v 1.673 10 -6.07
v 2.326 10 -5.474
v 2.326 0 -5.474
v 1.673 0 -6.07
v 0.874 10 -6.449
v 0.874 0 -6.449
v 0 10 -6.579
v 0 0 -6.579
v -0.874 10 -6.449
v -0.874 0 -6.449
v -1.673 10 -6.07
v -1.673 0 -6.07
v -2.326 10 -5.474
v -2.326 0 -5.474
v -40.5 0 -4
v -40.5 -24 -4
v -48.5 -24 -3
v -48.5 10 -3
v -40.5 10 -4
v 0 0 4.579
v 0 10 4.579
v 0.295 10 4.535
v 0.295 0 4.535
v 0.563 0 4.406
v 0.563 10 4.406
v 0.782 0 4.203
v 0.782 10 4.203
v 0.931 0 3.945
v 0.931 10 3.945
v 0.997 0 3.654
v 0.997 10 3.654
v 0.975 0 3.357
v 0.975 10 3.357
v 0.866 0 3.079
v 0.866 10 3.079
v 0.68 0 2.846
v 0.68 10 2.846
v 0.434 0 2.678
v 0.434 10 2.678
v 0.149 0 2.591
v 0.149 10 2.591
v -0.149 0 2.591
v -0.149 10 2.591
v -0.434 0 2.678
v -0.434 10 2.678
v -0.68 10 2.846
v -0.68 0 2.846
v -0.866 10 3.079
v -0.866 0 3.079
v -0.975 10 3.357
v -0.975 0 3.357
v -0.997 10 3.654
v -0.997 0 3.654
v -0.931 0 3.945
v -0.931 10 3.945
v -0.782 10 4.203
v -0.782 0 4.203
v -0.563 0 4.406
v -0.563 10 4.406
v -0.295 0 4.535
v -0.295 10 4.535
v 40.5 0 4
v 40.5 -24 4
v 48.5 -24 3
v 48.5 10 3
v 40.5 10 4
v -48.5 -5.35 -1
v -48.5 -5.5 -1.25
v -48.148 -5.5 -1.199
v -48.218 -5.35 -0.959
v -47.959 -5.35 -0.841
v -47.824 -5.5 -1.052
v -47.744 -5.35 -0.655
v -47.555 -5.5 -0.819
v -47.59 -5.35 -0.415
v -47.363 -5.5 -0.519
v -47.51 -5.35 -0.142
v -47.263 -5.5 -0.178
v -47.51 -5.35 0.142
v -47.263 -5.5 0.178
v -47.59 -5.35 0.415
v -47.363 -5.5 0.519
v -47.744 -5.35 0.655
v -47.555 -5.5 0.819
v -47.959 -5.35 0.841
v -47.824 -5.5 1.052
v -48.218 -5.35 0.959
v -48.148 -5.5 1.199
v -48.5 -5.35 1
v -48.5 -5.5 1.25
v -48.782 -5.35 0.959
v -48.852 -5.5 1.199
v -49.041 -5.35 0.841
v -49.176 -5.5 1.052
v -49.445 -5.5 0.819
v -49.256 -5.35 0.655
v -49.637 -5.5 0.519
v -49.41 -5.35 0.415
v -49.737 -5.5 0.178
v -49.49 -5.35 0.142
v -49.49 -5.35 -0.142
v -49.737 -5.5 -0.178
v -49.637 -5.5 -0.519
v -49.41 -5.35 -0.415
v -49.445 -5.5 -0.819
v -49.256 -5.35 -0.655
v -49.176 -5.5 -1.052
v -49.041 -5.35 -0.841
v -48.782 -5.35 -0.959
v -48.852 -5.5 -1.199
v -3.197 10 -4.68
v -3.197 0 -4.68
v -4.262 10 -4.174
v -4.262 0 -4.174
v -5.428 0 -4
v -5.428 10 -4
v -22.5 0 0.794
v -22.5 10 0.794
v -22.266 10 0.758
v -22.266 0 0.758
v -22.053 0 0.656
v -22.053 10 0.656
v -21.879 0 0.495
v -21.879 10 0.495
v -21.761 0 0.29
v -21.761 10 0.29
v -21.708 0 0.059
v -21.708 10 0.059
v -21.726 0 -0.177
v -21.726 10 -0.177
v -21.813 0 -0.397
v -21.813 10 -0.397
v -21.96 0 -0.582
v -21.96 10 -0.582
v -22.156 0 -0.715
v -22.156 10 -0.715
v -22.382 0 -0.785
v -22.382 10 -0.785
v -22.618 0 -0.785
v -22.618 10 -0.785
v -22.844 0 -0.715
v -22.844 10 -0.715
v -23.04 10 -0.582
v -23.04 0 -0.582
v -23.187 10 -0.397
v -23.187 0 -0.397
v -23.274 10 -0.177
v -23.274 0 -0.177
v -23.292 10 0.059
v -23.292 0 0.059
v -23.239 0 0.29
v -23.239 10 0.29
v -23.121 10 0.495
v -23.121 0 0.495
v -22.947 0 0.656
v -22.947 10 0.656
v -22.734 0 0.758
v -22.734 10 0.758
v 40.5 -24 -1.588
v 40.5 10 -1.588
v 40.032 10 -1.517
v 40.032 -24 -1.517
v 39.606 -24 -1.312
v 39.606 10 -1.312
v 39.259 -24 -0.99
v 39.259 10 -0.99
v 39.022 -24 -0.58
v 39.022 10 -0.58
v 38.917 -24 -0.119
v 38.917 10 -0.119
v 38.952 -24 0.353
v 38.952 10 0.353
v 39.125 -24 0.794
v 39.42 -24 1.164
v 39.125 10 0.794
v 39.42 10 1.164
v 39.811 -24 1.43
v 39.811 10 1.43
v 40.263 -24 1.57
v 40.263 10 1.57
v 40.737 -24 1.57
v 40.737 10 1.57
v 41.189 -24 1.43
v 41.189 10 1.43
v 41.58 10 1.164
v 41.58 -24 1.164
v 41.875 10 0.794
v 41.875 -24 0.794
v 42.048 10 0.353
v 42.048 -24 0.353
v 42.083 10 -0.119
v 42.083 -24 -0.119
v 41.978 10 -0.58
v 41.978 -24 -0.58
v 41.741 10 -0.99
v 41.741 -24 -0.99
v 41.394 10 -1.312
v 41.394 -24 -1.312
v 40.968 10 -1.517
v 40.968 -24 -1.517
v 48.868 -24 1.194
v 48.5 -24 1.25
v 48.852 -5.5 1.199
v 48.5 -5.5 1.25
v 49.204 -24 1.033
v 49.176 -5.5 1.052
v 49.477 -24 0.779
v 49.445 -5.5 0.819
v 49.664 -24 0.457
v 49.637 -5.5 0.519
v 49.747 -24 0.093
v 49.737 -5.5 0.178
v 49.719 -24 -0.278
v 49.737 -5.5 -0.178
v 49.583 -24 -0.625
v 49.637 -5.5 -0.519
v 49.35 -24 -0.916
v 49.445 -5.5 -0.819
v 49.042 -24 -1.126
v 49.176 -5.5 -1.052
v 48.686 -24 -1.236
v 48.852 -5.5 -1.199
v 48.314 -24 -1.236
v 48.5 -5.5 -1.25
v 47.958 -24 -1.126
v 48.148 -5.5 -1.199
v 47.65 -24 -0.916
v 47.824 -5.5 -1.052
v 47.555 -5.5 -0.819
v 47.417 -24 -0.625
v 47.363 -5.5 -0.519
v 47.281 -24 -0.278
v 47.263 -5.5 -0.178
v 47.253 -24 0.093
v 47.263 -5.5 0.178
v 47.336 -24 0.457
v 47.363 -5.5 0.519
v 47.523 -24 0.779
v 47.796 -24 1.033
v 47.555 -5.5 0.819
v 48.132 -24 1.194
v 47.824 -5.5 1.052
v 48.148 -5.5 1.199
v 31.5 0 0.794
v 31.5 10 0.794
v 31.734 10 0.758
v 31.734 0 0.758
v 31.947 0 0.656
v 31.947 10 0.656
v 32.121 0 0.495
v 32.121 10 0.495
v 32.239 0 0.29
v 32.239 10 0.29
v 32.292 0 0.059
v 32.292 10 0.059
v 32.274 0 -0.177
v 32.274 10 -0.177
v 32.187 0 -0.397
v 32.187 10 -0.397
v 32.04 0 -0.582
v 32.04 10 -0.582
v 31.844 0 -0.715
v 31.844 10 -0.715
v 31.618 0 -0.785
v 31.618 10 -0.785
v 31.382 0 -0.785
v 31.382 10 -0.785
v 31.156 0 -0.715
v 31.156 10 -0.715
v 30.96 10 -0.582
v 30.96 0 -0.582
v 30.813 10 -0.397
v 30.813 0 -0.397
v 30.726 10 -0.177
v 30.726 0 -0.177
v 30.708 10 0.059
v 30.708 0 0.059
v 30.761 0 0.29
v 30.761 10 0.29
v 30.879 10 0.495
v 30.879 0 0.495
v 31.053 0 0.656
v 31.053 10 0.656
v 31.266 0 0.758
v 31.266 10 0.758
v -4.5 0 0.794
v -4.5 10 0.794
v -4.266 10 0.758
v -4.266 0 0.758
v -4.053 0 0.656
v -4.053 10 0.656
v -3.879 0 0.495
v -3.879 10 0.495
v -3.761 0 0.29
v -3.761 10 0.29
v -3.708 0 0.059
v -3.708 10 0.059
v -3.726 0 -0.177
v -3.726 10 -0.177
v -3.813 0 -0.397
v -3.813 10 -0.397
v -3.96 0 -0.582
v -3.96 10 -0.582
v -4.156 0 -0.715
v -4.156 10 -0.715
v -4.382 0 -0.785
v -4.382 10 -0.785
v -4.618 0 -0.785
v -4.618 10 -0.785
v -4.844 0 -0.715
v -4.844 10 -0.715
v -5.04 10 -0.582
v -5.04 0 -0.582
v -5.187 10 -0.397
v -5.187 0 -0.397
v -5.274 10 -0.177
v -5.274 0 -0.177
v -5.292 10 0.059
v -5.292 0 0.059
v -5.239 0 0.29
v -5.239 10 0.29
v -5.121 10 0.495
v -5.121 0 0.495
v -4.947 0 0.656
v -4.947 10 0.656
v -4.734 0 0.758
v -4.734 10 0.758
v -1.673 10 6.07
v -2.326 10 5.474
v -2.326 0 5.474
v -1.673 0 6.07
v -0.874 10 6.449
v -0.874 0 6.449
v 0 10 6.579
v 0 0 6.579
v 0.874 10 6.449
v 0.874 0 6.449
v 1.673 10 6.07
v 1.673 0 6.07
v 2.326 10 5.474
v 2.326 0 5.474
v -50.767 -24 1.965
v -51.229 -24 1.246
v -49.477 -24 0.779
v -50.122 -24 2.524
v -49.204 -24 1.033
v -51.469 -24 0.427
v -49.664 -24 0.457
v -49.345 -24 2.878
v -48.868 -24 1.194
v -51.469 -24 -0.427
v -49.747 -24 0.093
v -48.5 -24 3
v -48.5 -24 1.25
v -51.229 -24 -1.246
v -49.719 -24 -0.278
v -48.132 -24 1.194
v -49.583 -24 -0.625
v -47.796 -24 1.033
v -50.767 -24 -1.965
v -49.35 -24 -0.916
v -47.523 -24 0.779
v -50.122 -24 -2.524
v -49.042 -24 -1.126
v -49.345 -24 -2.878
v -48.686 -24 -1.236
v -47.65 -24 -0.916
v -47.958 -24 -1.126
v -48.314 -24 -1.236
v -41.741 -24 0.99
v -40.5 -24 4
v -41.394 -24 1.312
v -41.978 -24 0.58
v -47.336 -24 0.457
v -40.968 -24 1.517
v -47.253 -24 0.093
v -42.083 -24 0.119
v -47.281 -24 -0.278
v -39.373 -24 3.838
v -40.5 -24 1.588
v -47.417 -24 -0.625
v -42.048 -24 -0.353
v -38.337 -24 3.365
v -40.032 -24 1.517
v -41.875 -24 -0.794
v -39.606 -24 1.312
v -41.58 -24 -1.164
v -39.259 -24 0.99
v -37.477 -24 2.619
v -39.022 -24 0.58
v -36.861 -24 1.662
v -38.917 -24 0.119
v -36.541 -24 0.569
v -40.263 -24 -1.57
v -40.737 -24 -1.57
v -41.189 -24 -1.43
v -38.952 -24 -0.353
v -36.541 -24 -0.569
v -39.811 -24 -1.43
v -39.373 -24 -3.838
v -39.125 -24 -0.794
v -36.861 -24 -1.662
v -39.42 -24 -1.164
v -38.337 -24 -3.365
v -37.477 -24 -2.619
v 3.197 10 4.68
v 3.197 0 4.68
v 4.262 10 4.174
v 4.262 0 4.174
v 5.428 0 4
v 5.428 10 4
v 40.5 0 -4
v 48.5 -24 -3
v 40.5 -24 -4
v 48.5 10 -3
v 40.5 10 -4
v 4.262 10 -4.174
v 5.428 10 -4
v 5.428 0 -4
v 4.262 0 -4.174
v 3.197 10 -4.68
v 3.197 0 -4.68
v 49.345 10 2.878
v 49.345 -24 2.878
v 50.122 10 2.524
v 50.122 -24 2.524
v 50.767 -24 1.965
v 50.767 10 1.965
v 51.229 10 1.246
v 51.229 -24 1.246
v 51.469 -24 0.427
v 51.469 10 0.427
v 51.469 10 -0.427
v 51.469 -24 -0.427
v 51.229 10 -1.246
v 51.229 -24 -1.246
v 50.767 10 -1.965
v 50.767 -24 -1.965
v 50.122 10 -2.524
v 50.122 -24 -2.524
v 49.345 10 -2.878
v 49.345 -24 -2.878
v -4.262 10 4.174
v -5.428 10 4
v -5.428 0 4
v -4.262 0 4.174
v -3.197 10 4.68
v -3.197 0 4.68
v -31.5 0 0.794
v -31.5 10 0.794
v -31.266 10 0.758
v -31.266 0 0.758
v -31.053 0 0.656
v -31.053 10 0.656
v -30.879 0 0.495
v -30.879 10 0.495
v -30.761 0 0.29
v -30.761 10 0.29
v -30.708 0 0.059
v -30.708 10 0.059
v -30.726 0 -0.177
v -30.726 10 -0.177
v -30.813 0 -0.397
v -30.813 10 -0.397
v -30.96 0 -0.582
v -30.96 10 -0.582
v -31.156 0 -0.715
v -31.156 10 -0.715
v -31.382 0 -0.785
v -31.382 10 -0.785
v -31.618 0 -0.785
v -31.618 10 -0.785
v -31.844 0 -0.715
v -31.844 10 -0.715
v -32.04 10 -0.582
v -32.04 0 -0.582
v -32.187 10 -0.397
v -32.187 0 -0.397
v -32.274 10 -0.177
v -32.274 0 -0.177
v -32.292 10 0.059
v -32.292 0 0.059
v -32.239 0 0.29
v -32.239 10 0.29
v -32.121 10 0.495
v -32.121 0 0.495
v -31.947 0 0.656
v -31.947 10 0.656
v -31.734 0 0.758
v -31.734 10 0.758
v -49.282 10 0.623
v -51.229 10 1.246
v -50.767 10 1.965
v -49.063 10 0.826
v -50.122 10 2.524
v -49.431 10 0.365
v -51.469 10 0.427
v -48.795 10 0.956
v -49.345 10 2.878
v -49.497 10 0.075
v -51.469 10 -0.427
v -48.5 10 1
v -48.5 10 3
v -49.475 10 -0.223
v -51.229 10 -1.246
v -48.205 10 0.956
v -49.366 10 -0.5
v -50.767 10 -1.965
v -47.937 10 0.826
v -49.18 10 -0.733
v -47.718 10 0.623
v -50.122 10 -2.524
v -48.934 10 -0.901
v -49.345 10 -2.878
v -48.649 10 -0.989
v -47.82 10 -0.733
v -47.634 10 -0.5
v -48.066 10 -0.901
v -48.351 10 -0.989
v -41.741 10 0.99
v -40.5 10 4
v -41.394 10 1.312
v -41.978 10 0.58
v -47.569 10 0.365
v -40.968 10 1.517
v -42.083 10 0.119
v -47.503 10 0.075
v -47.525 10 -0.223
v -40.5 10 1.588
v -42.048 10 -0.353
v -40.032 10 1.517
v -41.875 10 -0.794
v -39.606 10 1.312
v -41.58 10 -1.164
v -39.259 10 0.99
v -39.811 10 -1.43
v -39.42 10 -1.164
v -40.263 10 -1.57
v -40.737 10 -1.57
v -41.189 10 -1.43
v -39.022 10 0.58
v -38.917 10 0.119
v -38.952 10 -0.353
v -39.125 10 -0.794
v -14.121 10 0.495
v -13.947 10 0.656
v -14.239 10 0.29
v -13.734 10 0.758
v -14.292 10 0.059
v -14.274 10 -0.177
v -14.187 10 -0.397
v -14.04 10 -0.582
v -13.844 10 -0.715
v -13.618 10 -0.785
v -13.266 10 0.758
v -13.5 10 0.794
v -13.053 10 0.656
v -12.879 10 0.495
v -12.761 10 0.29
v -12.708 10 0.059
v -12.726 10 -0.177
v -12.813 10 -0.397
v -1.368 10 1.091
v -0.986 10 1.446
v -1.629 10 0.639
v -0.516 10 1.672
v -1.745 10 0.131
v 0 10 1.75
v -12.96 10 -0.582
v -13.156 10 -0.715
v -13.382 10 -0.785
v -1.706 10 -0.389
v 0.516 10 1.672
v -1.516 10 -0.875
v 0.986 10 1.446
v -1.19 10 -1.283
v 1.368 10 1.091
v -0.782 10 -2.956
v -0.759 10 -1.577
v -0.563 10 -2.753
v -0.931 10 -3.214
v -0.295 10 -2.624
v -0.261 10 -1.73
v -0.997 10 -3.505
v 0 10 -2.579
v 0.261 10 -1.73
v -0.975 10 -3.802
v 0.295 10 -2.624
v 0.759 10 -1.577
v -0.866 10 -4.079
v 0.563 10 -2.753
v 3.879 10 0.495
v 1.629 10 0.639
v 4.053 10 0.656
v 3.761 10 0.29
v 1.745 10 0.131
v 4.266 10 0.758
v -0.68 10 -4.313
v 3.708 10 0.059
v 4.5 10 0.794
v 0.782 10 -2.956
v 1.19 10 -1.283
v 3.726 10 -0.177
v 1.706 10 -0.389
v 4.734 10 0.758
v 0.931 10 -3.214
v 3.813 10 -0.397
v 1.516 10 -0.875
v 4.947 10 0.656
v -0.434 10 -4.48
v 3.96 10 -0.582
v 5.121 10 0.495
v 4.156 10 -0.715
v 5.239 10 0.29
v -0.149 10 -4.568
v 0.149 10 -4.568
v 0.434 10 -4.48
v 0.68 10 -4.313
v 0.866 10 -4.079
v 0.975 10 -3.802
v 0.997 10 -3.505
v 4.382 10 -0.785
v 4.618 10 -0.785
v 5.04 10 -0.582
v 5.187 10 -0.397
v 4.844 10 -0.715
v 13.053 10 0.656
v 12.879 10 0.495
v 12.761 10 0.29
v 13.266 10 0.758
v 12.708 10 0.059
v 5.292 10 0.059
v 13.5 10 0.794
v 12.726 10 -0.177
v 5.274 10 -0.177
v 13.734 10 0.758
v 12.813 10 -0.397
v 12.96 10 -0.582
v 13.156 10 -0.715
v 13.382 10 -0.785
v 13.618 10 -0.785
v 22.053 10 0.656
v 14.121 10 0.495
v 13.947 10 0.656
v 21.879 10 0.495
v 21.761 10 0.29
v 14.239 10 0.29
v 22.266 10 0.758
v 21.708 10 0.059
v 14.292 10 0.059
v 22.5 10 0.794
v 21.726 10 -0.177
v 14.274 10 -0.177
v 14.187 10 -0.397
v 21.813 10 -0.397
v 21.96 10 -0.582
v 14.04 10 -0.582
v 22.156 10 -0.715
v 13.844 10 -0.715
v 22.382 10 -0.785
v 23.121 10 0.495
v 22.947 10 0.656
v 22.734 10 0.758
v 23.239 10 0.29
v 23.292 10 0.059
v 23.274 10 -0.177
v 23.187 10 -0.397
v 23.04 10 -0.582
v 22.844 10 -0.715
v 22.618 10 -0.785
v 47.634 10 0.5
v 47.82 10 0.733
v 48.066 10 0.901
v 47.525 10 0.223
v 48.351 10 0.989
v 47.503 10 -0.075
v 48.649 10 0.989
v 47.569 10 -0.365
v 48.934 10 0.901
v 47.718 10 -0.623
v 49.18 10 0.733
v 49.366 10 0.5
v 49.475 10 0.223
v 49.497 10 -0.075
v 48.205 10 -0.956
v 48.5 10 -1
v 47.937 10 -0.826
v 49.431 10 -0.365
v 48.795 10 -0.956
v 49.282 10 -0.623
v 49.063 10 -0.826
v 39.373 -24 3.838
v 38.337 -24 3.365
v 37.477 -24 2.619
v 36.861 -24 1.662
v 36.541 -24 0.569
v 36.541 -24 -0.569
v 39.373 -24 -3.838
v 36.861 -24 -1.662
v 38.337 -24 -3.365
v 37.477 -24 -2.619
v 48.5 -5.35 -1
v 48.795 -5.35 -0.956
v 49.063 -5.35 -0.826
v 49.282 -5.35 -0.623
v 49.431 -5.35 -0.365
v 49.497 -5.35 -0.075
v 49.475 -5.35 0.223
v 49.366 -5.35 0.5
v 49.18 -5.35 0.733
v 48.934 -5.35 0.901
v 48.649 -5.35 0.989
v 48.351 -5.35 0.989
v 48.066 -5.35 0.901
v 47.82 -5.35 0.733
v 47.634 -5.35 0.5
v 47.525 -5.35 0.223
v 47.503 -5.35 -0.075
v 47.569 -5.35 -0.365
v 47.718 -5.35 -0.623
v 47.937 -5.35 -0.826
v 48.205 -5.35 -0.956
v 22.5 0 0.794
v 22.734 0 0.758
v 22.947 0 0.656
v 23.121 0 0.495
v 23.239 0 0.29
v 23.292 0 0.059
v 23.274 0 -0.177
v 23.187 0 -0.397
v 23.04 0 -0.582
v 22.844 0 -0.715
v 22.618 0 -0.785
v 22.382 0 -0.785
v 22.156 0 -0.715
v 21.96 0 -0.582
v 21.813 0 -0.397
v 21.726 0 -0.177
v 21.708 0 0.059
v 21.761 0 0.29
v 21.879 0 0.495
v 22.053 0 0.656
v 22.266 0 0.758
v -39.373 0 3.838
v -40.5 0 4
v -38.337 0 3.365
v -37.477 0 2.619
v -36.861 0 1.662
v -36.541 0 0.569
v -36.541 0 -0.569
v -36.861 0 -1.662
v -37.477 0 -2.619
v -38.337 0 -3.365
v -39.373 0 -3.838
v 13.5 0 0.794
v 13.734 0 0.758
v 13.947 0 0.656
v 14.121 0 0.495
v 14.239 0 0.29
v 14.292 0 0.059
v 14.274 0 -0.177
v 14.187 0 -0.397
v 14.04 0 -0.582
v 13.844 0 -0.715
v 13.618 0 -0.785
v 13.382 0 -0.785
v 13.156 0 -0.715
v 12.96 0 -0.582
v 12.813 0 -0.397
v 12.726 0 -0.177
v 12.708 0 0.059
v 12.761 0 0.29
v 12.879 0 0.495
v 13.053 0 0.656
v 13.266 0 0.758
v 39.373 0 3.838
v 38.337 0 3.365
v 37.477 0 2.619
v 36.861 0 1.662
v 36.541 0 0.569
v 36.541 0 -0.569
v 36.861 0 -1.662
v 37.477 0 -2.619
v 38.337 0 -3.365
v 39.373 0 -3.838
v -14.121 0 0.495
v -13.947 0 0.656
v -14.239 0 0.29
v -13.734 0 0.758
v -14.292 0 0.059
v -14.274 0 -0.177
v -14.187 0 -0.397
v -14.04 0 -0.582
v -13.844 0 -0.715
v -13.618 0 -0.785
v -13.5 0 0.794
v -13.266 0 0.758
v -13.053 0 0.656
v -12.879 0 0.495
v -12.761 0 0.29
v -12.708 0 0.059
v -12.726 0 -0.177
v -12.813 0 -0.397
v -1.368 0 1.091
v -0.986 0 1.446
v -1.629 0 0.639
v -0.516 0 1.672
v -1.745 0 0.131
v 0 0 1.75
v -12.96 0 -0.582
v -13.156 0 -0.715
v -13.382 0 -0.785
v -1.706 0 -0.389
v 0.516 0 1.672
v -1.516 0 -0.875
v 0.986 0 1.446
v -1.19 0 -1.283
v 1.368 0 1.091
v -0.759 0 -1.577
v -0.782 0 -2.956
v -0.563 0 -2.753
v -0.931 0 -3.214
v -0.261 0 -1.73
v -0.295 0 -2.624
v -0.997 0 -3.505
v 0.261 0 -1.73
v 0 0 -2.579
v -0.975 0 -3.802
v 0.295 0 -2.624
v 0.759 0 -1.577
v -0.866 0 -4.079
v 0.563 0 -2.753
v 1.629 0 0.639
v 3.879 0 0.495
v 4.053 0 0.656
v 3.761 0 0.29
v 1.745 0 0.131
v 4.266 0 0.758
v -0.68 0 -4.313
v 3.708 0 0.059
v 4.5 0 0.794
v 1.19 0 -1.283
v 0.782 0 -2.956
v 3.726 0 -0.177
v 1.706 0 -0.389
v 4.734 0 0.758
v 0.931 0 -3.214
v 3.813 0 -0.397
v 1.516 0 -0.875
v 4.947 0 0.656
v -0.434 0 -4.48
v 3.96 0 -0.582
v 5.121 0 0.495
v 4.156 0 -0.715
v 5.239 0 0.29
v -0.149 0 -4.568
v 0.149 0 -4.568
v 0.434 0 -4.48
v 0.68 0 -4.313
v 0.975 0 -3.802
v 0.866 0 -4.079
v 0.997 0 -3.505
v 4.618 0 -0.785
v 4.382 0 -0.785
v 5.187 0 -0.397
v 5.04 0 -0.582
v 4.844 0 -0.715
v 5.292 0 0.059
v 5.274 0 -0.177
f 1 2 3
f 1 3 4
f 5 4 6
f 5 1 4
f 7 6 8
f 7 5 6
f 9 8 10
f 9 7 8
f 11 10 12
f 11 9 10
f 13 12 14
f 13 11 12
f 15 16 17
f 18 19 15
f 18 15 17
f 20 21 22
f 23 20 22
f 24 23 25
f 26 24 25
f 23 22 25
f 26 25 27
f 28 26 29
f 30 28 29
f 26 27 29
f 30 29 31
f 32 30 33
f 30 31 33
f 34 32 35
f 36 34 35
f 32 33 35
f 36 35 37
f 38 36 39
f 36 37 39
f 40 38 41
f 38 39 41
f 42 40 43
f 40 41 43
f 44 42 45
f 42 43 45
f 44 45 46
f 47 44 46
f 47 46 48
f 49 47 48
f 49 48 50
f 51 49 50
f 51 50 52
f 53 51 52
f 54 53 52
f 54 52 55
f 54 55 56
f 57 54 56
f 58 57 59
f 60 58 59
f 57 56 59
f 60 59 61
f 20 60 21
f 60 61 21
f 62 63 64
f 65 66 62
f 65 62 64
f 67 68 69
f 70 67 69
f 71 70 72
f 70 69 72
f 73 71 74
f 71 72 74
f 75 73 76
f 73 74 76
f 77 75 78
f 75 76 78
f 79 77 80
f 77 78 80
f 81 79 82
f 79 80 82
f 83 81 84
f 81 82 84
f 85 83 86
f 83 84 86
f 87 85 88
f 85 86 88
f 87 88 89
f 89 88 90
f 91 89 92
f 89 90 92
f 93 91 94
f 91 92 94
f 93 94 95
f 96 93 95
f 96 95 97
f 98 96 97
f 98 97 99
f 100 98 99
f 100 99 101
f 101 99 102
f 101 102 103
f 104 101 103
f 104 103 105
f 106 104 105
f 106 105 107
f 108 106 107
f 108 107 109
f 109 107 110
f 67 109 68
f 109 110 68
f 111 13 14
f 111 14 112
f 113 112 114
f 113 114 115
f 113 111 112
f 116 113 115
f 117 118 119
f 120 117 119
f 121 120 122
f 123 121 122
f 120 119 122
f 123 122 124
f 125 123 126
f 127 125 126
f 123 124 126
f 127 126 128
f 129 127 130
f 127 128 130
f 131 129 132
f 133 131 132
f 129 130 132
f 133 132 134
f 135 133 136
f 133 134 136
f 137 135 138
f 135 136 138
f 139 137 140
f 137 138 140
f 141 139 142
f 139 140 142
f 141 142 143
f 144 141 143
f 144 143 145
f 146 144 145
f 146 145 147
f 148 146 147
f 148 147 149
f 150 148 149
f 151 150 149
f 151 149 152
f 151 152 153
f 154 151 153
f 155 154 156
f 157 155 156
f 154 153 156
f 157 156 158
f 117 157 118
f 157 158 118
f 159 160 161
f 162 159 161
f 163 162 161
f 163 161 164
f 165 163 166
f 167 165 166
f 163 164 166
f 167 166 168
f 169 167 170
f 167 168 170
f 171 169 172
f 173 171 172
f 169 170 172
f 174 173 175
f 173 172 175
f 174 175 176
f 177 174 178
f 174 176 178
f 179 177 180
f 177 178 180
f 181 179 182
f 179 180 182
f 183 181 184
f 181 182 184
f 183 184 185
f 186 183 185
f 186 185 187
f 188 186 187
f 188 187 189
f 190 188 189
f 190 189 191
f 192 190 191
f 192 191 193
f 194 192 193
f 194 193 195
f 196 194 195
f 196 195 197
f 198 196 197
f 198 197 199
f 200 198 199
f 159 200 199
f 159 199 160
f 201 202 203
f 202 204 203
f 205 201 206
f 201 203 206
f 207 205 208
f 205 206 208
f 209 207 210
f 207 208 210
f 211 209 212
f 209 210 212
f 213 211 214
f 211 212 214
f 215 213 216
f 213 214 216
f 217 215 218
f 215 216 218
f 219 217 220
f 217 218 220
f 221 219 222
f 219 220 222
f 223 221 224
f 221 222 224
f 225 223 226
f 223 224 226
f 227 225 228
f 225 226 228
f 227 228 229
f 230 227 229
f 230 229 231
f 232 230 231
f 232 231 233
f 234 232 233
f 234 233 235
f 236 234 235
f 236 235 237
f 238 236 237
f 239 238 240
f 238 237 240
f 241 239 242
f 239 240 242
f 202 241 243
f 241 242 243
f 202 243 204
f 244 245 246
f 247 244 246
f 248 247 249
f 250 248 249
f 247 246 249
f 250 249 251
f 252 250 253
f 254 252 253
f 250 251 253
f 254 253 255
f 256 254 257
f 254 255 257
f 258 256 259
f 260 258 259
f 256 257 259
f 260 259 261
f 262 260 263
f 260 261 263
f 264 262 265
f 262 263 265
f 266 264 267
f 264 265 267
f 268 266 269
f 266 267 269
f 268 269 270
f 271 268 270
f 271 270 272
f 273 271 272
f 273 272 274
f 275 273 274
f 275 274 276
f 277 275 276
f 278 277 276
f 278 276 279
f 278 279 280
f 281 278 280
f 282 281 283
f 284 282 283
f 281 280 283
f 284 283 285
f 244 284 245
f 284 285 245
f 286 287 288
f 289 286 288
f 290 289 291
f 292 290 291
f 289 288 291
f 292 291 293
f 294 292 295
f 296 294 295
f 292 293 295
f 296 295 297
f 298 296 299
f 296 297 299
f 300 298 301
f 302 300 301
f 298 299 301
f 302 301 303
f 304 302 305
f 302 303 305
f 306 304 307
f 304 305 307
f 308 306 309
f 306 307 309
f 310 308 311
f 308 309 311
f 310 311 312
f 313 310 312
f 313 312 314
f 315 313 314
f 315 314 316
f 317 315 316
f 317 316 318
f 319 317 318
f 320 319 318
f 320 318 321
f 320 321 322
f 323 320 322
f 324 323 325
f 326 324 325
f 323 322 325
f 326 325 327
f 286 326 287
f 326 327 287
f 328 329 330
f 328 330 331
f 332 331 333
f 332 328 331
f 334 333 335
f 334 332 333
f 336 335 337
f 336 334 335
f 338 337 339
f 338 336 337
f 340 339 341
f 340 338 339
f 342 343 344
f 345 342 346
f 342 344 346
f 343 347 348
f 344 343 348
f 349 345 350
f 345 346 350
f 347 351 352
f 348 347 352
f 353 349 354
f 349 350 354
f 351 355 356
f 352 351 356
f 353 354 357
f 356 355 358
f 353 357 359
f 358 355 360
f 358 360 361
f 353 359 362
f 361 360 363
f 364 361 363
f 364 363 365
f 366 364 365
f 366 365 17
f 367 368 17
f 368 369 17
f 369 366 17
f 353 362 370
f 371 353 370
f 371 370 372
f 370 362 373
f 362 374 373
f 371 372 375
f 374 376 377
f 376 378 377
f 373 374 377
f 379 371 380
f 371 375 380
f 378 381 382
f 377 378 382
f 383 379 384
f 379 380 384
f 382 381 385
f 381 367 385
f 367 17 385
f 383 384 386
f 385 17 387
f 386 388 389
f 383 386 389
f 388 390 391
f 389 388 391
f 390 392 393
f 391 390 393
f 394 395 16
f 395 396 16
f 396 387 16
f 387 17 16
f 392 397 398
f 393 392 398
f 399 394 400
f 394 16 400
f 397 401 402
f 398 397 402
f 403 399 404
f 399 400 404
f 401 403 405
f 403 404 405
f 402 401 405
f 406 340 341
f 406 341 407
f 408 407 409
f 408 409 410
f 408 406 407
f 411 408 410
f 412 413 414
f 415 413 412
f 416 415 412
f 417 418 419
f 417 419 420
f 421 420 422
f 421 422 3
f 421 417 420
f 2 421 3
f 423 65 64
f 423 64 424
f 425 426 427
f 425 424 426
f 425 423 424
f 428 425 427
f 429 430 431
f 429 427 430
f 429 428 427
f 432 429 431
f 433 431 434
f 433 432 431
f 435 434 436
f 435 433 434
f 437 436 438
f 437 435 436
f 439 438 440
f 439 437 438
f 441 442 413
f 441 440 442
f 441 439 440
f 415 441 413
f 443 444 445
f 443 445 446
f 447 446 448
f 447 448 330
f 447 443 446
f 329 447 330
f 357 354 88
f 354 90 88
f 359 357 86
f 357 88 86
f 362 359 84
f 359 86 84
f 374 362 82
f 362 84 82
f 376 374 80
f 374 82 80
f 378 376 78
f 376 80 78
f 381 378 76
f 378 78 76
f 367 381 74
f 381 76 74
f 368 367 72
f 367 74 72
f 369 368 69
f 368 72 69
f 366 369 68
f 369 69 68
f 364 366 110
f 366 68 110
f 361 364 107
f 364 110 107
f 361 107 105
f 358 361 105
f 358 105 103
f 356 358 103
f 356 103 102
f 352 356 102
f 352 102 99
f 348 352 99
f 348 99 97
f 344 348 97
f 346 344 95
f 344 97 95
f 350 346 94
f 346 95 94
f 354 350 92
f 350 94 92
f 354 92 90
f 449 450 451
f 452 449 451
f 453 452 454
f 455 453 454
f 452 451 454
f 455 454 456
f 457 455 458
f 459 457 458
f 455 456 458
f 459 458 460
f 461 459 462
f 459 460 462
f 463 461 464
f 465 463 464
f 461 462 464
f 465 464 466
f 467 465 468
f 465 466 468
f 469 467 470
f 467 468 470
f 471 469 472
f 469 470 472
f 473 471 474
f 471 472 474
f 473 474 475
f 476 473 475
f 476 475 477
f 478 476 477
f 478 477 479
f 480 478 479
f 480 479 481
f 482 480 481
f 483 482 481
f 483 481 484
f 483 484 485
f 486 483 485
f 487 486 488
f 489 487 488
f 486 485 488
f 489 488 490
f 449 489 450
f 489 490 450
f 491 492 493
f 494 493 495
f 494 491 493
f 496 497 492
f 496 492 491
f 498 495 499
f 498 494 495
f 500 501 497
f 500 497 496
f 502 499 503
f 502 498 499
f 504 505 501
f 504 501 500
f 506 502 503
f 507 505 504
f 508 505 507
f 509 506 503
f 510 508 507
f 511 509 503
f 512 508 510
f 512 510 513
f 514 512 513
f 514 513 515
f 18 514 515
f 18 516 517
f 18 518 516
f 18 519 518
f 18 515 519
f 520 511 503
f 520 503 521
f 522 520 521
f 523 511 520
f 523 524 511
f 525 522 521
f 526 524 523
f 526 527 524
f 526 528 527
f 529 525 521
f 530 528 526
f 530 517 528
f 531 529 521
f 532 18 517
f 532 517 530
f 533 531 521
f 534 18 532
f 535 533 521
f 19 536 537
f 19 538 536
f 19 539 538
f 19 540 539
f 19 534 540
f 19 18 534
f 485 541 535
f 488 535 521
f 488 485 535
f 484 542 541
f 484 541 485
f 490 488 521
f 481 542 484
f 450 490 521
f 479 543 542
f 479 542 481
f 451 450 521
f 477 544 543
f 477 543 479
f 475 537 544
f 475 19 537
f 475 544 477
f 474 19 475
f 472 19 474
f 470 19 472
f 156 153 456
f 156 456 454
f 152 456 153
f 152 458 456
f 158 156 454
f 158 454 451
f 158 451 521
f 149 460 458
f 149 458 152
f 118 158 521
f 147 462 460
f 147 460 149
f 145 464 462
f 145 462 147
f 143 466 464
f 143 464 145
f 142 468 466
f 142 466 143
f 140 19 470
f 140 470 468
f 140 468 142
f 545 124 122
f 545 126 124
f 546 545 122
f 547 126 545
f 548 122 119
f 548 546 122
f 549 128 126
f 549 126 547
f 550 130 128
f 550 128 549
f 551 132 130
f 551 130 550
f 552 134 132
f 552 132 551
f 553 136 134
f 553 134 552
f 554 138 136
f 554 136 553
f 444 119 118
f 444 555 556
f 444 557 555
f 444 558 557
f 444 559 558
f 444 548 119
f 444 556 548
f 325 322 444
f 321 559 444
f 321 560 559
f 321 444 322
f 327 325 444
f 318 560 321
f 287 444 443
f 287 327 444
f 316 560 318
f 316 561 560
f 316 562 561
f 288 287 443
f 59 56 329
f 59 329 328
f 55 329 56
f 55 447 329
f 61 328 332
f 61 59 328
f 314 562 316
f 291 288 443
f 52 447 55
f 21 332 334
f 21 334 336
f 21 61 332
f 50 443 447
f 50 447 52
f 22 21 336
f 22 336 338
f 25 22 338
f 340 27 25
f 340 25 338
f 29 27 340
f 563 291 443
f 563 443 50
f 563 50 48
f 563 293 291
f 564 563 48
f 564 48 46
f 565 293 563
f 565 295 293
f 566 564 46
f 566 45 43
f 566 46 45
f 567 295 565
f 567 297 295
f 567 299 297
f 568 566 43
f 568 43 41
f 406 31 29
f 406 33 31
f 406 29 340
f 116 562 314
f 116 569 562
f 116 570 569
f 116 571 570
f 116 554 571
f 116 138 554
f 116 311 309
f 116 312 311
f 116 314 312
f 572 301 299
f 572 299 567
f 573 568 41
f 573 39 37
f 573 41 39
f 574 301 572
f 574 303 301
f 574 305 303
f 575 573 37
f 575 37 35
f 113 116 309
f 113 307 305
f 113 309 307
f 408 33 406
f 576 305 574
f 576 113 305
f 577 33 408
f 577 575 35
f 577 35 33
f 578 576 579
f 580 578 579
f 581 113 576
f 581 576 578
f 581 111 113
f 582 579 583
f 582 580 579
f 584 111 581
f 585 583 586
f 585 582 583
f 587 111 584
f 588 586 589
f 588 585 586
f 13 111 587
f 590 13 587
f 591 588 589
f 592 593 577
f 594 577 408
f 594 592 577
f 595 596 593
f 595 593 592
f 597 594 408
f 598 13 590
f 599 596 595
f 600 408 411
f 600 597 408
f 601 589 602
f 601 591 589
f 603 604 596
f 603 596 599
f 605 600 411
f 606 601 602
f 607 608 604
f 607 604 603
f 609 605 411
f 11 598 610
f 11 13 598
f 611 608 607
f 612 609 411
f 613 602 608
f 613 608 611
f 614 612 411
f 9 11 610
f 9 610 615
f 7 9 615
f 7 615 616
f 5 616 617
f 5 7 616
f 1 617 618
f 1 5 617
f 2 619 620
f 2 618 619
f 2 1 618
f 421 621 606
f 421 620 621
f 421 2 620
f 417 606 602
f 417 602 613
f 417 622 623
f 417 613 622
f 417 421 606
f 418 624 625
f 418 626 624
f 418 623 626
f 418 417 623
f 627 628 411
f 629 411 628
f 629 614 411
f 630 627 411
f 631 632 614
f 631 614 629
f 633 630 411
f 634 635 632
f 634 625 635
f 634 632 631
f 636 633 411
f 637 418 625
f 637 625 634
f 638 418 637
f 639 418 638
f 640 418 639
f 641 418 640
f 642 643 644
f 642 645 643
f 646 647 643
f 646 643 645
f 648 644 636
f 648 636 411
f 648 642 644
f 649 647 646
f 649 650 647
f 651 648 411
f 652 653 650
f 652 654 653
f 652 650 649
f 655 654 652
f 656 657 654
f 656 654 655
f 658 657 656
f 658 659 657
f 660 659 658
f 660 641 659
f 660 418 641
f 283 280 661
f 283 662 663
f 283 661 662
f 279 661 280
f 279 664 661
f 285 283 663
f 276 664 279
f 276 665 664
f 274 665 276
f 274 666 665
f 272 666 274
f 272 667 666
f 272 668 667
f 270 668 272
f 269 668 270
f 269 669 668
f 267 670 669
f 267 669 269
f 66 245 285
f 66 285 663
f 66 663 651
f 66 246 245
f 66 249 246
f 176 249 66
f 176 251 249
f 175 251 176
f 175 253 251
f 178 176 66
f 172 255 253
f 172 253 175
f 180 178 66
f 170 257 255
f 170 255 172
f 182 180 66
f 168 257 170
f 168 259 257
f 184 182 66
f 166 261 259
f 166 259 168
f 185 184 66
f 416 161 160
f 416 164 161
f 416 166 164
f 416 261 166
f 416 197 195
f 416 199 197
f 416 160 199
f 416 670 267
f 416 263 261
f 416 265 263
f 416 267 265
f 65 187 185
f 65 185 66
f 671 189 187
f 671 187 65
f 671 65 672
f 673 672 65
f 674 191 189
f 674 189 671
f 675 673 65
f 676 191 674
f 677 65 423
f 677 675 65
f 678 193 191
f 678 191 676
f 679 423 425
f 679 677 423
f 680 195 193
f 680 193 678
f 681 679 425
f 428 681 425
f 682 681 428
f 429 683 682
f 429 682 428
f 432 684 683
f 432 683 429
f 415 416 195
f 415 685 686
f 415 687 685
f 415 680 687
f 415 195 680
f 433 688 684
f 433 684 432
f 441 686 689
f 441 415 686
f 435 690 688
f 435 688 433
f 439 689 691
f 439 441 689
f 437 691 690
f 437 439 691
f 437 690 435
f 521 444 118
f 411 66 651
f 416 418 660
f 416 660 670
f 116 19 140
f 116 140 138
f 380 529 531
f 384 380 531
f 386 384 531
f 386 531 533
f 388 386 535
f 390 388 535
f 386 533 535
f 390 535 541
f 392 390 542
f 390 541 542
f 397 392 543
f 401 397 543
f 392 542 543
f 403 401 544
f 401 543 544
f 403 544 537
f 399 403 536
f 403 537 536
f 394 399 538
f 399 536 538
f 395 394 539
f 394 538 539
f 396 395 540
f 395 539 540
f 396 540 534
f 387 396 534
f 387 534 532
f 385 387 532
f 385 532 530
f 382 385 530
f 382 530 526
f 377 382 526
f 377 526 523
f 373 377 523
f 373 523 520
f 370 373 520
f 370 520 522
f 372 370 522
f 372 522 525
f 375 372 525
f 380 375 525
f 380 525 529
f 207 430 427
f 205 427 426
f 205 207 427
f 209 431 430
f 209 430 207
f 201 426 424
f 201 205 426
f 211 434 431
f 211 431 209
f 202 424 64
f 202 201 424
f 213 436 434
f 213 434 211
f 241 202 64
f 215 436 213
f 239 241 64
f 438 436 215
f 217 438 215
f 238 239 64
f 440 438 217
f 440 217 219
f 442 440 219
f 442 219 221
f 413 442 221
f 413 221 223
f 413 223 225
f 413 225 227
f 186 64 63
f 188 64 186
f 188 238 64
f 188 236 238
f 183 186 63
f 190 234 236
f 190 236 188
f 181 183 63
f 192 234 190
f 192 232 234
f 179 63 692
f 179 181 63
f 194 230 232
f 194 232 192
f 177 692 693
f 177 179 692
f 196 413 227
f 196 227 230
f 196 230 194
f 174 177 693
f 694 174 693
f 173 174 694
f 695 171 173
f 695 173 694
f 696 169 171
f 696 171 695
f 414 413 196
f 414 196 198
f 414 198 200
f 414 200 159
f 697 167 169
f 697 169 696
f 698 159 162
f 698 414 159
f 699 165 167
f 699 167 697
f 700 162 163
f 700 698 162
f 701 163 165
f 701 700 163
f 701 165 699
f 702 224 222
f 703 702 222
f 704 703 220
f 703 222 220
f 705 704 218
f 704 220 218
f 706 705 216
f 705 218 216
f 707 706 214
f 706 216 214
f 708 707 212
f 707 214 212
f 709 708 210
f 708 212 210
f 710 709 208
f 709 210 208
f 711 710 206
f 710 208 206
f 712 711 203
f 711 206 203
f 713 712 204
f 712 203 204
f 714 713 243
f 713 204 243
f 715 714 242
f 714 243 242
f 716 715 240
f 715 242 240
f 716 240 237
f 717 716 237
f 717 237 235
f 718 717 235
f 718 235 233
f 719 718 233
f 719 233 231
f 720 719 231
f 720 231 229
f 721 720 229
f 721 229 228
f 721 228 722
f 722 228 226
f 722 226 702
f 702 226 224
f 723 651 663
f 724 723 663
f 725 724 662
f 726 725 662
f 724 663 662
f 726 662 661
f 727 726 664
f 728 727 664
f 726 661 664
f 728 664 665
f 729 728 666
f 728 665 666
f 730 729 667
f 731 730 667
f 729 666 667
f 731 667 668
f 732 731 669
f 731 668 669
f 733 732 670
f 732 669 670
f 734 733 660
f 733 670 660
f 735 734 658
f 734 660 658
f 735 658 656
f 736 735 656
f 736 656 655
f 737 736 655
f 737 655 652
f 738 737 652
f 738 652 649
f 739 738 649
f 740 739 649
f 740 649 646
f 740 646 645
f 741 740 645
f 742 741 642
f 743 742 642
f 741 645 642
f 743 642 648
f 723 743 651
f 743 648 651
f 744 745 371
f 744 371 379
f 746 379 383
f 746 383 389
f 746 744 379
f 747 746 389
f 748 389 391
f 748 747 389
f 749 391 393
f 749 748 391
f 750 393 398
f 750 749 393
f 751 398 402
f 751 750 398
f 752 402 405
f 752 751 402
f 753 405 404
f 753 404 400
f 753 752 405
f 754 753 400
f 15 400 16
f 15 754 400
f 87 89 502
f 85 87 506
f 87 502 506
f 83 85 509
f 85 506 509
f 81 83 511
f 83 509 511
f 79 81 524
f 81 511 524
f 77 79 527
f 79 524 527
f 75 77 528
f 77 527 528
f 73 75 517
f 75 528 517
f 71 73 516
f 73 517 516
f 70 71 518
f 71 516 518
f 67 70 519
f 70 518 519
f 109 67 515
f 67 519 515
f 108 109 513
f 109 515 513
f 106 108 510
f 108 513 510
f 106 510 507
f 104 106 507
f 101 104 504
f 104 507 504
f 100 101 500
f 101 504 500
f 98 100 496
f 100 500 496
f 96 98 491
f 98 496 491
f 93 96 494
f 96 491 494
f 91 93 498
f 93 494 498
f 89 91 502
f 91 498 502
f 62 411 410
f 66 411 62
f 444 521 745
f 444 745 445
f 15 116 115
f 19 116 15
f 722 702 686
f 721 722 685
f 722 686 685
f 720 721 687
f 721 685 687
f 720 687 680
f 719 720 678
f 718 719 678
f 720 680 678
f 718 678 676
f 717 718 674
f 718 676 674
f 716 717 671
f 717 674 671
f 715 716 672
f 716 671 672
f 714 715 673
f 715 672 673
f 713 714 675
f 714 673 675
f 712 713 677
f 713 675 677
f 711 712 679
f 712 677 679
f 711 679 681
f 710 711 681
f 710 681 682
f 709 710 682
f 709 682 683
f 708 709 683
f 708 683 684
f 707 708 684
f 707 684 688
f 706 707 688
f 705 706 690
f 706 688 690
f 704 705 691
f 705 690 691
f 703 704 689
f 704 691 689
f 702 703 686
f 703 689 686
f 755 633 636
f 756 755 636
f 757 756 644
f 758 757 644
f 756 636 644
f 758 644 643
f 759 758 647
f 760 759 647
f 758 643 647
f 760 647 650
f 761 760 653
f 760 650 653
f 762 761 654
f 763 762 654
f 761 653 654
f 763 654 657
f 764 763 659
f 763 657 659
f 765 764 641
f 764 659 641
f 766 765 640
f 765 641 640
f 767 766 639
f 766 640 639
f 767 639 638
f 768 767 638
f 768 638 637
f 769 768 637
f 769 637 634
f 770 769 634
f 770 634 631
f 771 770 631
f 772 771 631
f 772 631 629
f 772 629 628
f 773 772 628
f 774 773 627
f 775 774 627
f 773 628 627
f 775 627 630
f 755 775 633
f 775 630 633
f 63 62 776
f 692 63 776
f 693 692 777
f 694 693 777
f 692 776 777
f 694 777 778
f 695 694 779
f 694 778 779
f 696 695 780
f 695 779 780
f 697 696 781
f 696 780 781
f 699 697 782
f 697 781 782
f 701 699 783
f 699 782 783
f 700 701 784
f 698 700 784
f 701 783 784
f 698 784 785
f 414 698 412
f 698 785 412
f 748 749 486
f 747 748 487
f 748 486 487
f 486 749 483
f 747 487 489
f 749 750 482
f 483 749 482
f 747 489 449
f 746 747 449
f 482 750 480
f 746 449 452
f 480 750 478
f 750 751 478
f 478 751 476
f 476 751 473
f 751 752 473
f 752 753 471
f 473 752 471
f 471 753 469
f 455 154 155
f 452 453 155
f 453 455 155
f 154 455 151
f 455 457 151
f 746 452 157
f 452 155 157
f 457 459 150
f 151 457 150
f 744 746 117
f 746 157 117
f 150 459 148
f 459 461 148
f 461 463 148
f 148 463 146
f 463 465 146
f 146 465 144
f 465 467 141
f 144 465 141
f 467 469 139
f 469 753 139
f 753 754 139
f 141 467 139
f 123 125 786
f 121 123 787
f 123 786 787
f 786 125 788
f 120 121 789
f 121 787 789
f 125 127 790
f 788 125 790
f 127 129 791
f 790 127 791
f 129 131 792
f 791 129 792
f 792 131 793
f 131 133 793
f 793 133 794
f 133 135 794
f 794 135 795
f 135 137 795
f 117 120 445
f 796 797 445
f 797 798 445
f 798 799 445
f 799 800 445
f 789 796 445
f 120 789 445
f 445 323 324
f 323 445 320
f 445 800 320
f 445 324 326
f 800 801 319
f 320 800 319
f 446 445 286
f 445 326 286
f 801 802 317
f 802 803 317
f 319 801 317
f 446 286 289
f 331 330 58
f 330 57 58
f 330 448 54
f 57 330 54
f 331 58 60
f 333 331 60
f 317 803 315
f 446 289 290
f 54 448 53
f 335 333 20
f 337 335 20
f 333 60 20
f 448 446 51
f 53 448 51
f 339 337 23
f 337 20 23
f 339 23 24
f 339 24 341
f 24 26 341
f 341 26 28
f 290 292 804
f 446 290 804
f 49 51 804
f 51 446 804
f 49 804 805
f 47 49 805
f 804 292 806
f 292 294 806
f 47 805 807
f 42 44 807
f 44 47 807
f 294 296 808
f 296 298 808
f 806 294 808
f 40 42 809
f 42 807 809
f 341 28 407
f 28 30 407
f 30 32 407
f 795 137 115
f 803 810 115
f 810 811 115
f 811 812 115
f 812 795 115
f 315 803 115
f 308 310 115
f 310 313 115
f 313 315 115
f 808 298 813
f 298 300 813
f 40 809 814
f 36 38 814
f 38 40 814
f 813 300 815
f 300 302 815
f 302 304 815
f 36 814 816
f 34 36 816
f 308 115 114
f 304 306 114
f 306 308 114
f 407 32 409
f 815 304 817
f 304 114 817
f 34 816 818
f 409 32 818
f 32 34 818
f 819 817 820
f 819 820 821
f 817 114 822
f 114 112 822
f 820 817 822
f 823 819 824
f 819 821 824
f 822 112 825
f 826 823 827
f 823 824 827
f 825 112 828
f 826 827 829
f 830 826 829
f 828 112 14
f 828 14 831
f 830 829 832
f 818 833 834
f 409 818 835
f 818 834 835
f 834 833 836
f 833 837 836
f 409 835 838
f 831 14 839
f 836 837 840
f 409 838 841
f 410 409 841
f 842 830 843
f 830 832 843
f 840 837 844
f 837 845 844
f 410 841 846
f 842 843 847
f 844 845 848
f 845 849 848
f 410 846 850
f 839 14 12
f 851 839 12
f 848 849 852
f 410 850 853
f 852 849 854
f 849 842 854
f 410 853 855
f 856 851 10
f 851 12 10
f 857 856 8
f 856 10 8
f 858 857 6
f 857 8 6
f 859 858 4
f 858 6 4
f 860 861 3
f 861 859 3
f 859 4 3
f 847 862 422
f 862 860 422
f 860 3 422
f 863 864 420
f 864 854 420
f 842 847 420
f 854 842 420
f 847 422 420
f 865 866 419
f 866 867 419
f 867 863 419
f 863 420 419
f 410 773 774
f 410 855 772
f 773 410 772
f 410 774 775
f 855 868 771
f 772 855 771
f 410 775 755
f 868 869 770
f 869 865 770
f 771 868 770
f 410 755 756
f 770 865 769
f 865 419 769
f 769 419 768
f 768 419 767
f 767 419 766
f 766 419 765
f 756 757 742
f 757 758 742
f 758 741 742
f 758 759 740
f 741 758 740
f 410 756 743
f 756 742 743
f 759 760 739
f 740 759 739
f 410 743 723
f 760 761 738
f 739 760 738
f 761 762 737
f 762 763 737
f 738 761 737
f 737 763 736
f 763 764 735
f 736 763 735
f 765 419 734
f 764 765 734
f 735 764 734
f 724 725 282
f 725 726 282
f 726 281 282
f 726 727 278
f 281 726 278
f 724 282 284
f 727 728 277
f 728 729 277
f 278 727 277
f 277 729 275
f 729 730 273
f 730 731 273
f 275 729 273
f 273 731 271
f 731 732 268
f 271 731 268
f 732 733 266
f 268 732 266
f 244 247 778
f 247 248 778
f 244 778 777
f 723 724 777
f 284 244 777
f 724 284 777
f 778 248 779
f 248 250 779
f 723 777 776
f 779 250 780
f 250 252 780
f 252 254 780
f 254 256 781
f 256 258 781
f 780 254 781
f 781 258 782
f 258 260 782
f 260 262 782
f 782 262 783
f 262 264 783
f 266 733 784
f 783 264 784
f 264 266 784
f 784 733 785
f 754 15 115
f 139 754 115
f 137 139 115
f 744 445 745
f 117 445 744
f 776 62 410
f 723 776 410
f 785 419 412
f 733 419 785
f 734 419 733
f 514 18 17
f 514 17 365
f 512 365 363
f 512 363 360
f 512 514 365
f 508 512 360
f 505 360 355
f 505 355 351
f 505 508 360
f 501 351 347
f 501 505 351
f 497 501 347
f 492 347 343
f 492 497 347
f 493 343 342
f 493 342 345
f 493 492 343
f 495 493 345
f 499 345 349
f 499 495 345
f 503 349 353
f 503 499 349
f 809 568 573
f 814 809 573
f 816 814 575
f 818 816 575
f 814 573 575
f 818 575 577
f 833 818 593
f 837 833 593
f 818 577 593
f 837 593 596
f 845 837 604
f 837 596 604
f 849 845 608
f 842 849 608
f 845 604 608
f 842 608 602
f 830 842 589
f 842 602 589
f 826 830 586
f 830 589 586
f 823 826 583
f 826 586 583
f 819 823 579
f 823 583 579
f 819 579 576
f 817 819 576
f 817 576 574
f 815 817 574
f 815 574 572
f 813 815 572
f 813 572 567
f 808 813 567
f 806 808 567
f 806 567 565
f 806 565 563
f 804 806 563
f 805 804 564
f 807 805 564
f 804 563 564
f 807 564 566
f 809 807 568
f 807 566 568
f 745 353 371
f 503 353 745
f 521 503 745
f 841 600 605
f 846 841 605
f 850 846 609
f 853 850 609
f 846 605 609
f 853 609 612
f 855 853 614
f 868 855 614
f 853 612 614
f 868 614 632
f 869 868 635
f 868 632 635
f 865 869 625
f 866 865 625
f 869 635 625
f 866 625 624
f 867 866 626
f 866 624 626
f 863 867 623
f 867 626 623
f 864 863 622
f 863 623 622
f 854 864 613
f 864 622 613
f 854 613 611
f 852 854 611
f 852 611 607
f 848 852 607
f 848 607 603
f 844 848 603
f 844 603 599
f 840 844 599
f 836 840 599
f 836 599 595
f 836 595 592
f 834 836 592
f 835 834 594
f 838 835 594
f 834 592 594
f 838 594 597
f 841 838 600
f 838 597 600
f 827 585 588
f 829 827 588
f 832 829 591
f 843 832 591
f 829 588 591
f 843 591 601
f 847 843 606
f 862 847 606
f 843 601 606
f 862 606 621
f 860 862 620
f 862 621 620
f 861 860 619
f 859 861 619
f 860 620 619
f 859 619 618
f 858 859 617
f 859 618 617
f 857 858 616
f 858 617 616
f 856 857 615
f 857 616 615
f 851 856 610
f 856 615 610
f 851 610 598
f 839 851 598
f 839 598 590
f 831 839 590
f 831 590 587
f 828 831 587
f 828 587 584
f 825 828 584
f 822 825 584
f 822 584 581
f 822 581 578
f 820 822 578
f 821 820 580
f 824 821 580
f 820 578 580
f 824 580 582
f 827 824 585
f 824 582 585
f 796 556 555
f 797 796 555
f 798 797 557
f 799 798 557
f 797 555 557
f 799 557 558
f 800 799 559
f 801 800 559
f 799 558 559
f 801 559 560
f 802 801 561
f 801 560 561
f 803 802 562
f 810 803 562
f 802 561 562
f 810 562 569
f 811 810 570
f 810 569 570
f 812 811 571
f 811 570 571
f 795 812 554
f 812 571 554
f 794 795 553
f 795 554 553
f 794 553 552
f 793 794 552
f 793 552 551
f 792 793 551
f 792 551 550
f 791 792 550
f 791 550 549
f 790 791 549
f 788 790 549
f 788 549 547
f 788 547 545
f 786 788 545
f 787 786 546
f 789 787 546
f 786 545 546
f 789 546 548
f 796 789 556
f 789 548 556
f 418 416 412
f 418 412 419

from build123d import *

# Parameters (mm, degrees)
SKETCH1_R                 = 1.5875
SKETCH1_R_2               = 1
BOSS_EXTRUDE1_DEPTH       = 24
BOSS_EXTRUDE1_2_DEPTH     = 24
BOSS_EXTRUDE2_START       = 10
SKETCH2_R                 = 0.79375
SKETCH2_R_2               = 1.5875
SKETCH2_R_3               = 1
SKETCH2_R_4               = 1.75
BOSS_EXTRUDE2_DEPTH       = 10
M3X0_5_TAPPED_HOLE1_D     = 2.5
M3X0_5_TAPPED_HOLE1_DEPTH = 18.5
M3X0_5_TAPPED_HOLE1_TIP   = 0.751075774


with BuildPart() as part:
    # Sketch1 → Boss-Extrude1 (new body)
    with BuildSketch(Plane(origin=(0, 0, 0), x_dir=(1, 0, 0), z_dir=(0, 1, 0))):
        with BuildLine():
            Line((-40.5, 4), (-48.5, 3))
            ThreePointArc((-48.5, 3), (-51.5, 0), (-48.5, -3))
            Line((-48.5, -3), (-40.5, -4))
            ThreePointArc((-40.5, -4), (-36.5, 0), (-40.5, 4))
        make_face()
        with Locations(Location((-40.5, 0, 0), (0, 0, 270))):
            Circle(SKETCH1_R, mode=Mode.SUBTRACT)
        with Locations(Location((-48.5, 0, 0), (0, 0, 270))):
            Circle(SKETCH1_R_2, mode=Mode.SUBTRACT)
    extrude(amount=-BOSS_EXTRUDE1_DEPTH)



with BuildPart() as body_2:
    # Sketch1 → Boss-Extrude1 2 (new body)
    with BuildSketch(Plane(origin=(0, 0, 0), x_dir=(1, 0, 0), z_dir=(0, 1, 0))):
        with BuildLine():
            Line((48.5, -3), (40.5, -4))
            ThreePointArc((40.5, -4), (36.5, 0), (40.5, 4))
            Line((40.5, 4), (48.5, 3))
            ThreePointArc((48.5, 3), (51.5, 0), (48.5, -3))
        make_face()
        with Locations(Location((40.5, 0, 0), (0, 0, 90))):
            Circle(SKETCH1_R, mode=Mode.SUBTRACT)
        with Locations(Location((48.5, 0, 0), (0, 0, 90))):
            Circle(SKETCH1_R_2, mode=Mode.SUBTRACT)
    extrude(amount=-BOSS_EXTRUDE1_2_DEPTH)


with BuildPart() as part_1:
    add(part.part)

    add(body_2.part)  # Boss-Extrude2 merges body 2
    # Sketch2 → Boss-Extrude2 (add)
    with BuildSketch(Plane(origin=(0, 0, 0), x_dir=(1, 0, 0), z_dir=(0, 1, 0)).offset(BOSS_EXTRUDE2_START)):
        with BuildLine():
            Line((-40.5, 4), (-48.5, 3))
            ThreePointArc((-48.5, 3), (-51.5, 0), (-48.5, -3))
            Line((-48.5, -3), (-40.5, -4))
            Line((-40.5, -4), (-5.427594702, -4))
            ThreePointArc((-5.427594702, -4), (-3.710635508, -4.387237743), (-2.326112015, -5.473974438))
            ThreePointArc((-2.326112015, -5.473974438), (0, -6.579455266), (2.326112015, -5.473974438))
            ThreePointArc((2.326112015, -5.473974438), (3.710635508, -4.387237743), (5.427594702, -4))
            Line((5.427594702, -4), (40.5, -4))
            Line((40.5, -4), (48.5, -3))
            ThreePointArc((48.5, -3), (51.5, 0), (48.5, 3))
            Line((48.5, 3), (40.5, 4))
            Line((40.5, 4), (5.427594702, 4))
            ThreePointArc((5.427594702, 4), (3.710635508, 4.387237743), (2.326112015, 5.473974438))
            ThreePointArc((2.326112015, 5.473974438), (0, 6.579455266), (-2.326112015, 5.473974438))
            ThreePointArc((-2.326112015, 5.473974438), (-3.710635508, 4.387237743), (-5.427594702, 4))
            Line((-5.427594702, 4), (-40.5, 4))
        make_face()
        with Locations(Location((-31.5, 0, 0), (0, 0, 270))):
            Circle(SKETCH2_R, mode=Mode.SUBTRACT)
        with Locations(Location((-22.5, 0, 0), (0, 0, 270))):
            Circle(SKETCH2_R, mode=Mode.SUBTRACT)
        with Locations(Location((-40.5, 0, 0), (0, 0, 270))):
            Circle(SKETCH2_R_2, mode=Mode.SUBTRACT)
        with Locations(Location((40.5, 0, 0), (0, 0, 90))):
            Circle(SKETCH2_R_2, mode=Mode.SUBTRACT)
        with Locations(Location((-13.5, 0, 0), (0, 0, 270))):
            Circle(SKETCH2_R, mode=Mode.SUBTRACT)
        with Locations(Location((-4.5, 0, 0), (0, 0, 270))):
            Circle(SKETCH2_R, mode=Mode.SUBTRACT)
        with Locations(Location((4.5, 0, 0), (0, 0, 270))):
            Circle(SKETCH2_R, mode=Mode.SUBTRACT)
        with Locations(Location((13.5, 0, 0), (0, 0, 270))):
            Circle(SKETCH2_R, mode=Mode.SUBTRACT)
        with Locations(Location((22.5, 0, 0), (0, 0, 270))):
            Circle(SKETCH2_R, mode=Mode.SUBTRACT)
        with Locations(Location((31.5, 0, 0), (0, 0, 270))):
            Circle(SKETCH2_R, mode=Mode.SUBTRACT)
        with Locations(Location((48.5, 0, 0), (0, 0, 90))):
            Circle(SKETCH2_R_3, mode=Mode.SUBTRACT)
        with Locations(Location((-48.5, 0, 0), (0, 0, 270))):
            Circle(SKETCH2_R_3, mode=Mode.SUBTRACT)
        with Locations(Location((0, 0, 0), (0, 0, 270))):
            Circle(SKETCH2_R_4, mode=Mode.SUBTRACT)
        with Locations(Location((0, -3.579455266, 0), (0, 0, 270))):
            Circle(SKETCH2_R_3, mode=Mode.SUBTRACT)
        with Locations(Location((0, 3.579455266, 0), (0, 0, 270))):
            Circle(SKETCH2_R_3, mode=Mode.SUBTRACT)
    extrude(amount=-BOSS_EXTRUDE2_DEPTH)

    # M3x0.5 Tapped Hole1
    with Locations(Plane(origin=(-48.5, -24, 0), x_dir=(0, 0, -1), z_dir=(0, -1, 0))):
        with Locations((0, 0), (0, 97)):
            Hole(M3X0_5_TAPPED_HOLE1_D / 2, depth=M3X0_5_TAPPED_HOLE1_DEPTH)
            with Locations((0, 0, -(M3X0_5_TAPPED_HOLE1_DEPTH + M3X0_5_TAPPED_HOLE1_TIP / 2))):  # 118° drill point
                Cone(0, M3X0_5_TAPPED_HOLE1_D / 2, M3X0_5_TAPPED_HOLE1_TIP, mode=Mode.SUBTRACT)


solid = part_1.part
